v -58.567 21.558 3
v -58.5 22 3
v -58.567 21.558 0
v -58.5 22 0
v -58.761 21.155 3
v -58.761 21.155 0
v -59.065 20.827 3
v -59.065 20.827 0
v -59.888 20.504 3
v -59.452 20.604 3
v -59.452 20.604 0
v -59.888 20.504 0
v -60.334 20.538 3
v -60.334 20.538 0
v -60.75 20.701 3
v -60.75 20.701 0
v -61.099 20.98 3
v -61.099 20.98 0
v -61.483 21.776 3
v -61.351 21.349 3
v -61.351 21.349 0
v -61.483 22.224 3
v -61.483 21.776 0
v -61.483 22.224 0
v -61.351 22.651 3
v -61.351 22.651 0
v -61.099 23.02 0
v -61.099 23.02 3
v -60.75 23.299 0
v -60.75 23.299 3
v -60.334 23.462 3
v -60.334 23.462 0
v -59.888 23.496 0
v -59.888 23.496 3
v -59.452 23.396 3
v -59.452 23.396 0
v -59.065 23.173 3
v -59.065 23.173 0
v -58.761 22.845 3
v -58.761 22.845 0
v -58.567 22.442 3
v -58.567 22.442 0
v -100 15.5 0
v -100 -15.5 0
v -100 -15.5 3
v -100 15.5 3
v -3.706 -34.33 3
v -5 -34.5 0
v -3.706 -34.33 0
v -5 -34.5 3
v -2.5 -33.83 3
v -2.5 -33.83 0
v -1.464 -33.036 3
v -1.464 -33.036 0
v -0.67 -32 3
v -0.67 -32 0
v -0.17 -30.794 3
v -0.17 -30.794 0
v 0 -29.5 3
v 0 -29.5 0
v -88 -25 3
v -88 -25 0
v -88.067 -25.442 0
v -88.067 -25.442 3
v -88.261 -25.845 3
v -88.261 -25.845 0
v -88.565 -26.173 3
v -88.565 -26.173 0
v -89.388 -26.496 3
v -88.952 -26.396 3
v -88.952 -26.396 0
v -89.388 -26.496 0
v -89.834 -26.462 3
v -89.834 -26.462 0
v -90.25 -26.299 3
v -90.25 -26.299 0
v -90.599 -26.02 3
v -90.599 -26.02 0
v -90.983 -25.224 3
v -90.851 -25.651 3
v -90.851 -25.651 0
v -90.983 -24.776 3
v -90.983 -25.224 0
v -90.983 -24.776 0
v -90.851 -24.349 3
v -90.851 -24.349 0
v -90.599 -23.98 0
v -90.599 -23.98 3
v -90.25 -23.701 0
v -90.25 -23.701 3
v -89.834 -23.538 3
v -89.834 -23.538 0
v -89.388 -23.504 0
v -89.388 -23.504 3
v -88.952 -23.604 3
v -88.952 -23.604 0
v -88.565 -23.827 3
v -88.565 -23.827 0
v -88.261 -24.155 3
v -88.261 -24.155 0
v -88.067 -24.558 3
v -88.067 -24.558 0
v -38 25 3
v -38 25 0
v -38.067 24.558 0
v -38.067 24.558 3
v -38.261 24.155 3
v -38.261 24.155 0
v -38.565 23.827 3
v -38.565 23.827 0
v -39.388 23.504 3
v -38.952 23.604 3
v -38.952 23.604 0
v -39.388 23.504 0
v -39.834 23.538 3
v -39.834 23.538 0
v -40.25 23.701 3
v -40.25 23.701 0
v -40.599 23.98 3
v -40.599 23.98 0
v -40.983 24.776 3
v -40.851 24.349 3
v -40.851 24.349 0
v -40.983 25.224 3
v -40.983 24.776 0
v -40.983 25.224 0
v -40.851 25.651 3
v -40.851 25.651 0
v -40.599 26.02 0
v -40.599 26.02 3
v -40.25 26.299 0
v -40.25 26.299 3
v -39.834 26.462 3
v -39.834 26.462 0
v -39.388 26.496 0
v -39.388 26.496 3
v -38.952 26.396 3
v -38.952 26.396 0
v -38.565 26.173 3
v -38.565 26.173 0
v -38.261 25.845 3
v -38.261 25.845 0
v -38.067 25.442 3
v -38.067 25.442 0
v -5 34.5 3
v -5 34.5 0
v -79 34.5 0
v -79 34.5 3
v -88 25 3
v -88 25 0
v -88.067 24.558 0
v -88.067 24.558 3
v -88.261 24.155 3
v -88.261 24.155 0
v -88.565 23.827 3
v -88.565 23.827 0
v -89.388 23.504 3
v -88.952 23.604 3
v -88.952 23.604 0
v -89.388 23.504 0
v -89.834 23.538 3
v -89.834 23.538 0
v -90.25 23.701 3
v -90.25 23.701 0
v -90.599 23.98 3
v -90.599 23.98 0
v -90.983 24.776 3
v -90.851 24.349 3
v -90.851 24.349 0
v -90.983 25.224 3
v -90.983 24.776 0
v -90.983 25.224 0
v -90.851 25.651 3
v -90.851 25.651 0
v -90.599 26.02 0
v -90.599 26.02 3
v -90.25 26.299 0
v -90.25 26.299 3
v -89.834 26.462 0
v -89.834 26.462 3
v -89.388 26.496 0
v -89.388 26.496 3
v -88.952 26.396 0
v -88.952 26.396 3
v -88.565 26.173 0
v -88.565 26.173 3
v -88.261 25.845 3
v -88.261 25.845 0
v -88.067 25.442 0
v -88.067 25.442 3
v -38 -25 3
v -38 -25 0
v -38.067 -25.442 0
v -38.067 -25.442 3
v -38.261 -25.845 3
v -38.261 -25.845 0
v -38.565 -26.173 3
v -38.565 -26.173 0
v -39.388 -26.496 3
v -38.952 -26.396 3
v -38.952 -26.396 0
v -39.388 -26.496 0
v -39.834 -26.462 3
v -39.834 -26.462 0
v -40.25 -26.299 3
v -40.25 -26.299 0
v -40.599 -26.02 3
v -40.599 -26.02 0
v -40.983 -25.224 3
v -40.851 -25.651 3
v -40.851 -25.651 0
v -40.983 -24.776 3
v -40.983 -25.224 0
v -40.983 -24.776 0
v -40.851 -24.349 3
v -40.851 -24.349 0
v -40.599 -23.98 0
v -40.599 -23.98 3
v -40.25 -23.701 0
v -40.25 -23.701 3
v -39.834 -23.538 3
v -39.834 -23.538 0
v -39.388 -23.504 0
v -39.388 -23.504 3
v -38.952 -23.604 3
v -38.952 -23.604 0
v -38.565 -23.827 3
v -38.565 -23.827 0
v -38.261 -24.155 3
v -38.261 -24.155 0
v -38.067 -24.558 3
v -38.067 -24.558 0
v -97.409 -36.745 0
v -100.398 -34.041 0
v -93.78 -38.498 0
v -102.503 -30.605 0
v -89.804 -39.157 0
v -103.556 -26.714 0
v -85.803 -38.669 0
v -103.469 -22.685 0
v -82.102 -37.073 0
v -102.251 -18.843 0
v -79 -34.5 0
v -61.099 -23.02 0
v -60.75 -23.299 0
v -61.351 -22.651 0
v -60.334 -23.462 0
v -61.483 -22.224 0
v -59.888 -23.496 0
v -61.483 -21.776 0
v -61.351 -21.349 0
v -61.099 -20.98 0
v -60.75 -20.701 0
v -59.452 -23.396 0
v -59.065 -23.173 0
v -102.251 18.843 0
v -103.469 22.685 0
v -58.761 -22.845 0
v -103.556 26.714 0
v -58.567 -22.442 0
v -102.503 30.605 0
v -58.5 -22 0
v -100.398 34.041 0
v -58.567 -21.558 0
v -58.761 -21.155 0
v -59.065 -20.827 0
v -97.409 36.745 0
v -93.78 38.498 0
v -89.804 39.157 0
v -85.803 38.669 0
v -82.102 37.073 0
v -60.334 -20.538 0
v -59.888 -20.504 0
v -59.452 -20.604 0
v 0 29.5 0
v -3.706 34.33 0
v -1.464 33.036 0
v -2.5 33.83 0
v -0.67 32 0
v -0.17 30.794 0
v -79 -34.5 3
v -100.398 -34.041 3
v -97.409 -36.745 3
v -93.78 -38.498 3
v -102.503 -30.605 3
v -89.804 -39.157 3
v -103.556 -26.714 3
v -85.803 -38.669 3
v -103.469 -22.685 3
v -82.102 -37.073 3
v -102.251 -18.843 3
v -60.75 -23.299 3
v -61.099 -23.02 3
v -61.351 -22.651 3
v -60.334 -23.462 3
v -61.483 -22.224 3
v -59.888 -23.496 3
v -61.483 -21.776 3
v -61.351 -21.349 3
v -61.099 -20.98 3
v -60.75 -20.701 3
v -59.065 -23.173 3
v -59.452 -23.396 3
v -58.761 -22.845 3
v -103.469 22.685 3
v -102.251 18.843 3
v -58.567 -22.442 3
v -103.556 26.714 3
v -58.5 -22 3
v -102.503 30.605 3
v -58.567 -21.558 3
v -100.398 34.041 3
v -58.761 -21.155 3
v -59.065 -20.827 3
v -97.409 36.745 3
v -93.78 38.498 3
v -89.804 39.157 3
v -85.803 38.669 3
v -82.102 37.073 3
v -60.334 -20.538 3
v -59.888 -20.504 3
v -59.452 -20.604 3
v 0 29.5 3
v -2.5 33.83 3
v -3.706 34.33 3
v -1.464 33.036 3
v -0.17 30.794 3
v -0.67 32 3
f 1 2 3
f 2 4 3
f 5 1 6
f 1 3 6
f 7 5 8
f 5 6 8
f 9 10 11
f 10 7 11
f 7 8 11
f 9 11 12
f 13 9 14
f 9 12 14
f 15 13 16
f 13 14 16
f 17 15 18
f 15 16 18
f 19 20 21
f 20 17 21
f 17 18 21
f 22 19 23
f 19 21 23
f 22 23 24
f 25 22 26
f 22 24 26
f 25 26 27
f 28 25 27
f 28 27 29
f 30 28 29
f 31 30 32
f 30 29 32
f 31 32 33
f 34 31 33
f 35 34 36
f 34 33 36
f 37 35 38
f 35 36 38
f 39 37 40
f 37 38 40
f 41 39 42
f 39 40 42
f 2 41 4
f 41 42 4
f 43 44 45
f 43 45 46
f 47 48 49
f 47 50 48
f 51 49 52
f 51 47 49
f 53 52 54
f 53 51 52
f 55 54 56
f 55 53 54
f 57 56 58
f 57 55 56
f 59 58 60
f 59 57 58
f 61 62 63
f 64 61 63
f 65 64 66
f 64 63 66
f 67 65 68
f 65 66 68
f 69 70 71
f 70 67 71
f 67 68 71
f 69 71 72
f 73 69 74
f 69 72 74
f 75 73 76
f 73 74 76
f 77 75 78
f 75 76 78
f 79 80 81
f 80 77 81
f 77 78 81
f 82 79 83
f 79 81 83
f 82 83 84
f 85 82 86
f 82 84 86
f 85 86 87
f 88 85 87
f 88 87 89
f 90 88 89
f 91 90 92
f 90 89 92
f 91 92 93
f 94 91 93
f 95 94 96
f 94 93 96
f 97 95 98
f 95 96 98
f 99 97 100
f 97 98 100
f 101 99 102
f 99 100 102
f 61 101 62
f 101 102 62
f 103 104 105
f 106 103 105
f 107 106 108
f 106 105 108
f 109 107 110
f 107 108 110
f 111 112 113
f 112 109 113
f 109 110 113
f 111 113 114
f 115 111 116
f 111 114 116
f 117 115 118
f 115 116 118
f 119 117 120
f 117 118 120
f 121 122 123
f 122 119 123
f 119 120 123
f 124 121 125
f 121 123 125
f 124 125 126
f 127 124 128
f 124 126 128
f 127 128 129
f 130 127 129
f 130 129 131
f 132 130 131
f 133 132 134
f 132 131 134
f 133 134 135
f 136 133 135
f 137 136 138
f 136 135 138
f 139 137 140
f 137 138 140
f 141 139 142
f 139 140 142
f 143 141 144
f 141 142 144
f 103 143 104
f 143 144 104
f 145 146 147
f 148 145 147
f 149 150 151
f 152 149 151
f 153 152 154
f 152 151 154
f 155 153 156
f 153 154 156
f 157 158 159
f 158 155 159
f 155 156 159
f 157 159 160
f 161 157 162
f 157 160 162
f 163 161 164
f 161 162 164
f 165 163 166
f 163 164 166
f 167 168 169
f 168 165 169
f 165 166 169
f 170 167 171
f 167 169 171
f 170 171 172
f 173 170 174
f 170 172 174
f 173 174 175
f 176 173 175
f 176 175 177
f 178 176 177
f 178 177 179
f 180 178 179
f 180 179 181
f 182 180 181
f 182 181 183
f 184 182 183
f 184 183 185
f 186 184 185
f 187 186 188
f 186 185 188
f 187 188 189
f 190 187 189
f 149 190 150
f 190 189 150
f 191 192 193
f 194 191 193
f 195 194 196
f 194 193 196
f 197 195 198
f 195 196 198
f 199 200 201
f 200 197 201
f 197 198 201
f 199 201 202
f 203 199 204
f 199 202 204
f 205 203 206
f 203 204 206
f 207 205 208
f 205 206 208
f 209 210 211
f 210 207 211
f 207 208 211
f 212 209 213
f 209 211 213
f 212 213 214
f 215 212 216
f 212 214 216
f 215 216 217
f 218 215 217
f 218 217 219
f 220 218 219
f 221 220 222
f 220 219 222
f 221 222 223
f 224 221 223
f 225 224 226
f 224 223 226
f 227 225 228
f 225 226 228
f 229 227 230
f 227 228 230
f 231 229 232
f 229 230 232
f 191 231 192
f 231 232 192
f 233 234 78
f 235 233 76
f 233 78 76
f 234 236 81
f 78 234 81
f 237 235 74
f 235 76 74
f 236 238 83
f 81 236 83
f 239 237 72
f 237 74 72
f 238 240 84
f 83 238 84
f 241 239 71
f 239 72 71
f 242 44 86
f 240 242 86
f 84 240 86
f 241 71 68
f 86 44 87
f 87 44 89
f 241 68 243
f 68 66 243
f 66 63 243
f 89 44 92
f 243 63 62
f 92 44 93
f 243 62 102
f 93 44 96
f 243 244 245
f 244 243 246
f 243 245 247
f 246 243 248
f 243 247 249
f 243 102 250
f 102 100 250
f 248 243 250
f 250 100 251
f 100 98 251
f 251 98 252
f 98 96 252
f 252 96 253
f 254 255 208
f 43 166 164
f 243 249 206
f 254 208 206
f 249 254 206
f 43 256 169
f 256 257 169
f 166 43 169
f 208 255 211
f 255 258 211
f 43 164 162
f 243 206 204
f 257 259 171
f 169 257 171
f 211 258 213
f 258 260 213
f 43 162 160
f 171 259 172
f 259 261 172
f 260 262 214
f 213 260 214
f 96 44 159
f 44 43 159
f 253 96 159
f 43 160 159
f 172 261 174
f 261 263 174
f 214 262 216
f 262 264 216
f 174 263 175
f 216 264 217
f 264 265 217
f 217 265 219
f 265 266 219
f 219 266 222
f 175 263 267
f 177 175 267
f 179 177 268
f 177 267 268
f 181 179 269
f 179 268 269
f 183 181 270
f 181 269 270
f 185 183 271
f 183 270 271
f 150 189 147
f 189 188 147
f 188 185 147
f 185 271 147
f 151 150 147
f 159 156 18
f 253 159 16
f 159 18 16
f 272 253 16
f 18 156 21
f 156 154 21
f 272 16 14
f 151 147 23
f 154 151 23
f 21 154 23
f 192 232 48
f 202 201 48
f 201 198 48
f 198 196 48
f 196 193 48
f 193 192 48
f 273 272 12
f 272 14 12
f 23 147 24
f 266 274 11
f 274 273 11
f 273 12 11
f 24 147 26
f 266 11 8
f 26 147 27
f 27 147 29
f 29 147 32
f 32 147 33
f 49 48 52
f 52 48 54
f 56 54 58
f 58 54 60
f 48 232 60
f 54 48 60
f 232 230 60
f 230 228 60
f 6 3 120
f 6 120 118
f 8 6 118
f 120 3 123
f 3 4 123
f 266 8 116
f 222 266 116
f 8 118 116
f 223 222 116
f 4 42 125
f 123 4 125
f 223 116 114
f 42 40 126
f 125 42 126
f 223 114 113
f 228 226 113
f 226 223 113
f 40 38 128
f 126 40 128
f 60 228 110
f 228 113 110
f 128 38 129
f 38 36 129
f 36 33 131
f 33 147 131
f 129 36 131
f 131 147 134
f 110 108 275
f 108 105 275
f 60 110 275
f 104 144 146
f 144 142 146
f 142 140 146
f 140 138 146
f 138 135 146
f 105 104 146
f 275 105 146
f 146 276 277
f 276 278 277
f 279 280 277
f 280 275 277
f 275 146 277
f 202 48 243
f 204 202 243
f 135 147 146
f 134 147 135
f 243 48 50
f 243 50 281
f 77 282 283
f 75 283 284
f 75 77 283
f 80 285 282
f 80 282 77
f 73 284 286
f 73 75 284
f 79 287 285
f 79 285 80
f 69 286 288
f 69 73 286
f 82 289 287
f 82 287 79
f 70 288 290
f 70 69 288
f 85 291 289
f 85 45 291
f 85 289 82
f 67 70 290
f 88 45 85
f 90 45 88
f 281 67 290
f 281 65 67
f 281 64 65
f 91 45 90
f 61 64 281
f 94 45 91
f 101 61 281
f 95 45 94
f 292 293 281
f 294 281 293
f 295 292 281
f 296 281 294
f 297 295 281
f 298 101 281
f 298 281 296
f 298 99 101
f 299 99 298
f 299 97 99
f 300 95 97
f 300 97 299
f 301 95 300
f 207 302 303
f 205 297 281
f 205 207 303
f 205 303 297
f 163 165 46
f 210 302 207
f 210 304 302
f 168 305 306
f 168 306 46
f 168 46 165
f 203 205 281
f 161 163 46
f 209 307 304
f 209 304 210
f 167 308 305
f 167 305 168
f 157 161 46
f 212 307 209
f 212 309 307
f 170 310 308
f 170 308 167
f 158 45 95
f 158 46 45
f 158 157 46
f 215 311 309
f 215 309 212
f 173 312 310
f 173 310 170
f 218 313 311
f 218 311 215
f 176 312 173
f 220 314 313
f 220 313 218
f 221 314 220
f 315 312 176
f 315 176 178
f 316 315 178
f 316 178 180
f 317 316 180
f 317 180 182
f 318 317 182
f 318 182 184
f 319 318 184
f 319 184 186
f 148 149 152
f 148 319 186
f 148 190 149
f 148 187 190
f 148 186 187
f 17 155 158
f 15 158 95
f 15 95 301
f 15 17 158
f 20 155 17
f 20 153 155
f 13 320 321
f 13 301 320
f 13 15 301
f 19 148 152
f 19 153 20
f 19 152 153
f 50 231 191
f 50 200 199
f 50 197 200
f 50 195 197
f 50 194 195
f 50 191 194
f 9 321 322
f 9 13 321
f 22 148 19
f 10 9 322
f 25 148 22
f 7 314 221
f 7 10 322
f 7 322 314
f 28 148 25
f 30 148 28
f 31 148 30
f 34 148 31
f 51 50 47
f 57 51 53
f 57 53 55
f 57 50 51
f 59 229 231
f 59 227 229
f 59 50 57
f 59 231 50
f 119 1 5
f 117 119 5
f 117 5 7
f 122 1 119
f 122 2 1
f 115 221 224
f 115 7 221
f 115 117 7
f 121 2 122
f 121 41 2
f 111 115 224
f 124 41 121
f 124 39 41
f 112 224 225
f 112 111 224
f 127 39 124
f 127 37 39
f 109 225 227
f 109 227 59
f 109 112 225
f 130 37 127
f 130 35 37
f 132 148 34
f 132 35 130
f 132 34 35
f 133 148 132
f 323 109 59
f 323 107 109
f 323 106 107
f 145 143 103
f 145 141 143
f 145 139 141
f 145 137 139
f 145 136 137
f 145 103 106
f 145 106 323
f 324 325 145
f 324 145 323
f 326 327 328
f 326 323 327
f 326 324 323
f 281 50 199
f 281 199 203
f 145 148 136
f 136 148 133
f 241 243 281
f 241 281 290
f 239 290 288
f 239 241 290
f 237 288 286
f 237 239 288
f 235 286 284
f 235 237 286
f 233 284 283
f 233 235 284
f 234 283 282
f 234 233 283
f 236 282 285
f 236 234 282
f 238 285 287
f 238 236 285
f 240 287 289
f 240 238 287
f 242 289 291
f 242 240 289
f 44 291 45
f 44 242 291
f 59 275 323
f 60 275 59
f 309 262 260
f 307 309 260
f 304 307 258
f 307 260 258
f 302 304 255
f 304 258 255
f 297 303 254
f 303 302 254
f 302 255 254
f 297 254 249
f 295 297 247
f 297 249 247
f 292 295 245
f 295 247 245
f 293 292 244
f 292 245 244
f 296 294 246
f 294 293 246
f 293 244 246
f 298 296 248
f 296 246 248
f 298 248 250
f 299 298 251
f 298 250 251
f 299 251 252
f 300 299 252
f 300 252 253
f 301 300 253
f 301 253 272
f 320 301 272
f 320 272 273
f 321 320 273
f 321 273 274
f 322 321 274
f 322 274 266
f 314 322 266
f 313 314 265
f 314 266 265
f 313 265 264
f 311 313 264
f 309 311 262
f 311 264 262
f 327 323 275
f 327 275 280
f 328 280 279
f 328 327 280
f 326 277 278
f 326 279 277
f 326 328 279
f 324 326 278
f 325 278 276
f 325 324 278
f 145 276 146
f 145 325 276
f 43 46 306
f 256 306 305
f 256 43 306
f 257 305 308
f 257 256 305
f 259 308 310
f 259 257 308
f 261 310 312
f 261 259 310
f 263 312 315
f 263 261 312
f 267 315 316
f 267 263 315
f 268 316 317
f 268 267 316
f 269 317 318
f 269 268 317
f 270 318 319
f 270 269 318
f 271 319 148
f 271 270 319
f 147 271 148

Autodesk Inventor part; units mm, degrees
ref_plane "YZ Plane" through (0, 0, 0) normal (1, 0, 0) x (0, 1, 0)
ref_plane "XZ Plane" through (0, 0, 0) normal (0, 1, 0) x (-1, 0, 0)
ref_plane "XY Plane" through (0, 0, 0) normal (0, 0, 1) x (1, 0, 0)
sketch "Sketch1" plane through (0, 0, 0) normal (0, 0, 1) x (1, 0, 0)
  point P0 (0, 0)
sketch "Sketch2" plane through (0, 0, 0) normal (0, 0, 1) x (1, 0, 0)
  line L0 (-100, -34.5) -> (-100, 34.5)
  circle A0 centre (-60, 22) radius 1.4998
  circle A1 centre (-60, -22) radius 1.4998
  circle A2 centre (-89.5, 25) radius 1.4998
  circle A3 centre (-89.5, -25) radius 1.4998
  circle A4 centre (-39.5, 25) radius 1.4998
  circle A5 centre (-39.5, -25) radius 1.4998
  circle A6 centre (-89.5, 25) radius 14.1598
  circle A7 centre (-89.5, -25) radius 14.1598
  line L1 (0, 34.5) -> (0, -34.5)
  line L2 (0, 34.5) -> (-100, 34.5)
  line L3 (0, -34.5) -> (-100, -34.5)
  point P0 (-100, 15.5)
  point P1 (-100, -15.5)
  point P2 (-79, -34.5)
  point P3 (-79, 34.5)
extrude "Extrusion1" add sketch "Sketch2" along normal blind 3
fillet "Fillet1" radius 5 2 edges at (0, 34.5, 1.5) (0, -34.5, 1.5)
properties part number "Power Distribution Board redo v2" material "CFRP"
